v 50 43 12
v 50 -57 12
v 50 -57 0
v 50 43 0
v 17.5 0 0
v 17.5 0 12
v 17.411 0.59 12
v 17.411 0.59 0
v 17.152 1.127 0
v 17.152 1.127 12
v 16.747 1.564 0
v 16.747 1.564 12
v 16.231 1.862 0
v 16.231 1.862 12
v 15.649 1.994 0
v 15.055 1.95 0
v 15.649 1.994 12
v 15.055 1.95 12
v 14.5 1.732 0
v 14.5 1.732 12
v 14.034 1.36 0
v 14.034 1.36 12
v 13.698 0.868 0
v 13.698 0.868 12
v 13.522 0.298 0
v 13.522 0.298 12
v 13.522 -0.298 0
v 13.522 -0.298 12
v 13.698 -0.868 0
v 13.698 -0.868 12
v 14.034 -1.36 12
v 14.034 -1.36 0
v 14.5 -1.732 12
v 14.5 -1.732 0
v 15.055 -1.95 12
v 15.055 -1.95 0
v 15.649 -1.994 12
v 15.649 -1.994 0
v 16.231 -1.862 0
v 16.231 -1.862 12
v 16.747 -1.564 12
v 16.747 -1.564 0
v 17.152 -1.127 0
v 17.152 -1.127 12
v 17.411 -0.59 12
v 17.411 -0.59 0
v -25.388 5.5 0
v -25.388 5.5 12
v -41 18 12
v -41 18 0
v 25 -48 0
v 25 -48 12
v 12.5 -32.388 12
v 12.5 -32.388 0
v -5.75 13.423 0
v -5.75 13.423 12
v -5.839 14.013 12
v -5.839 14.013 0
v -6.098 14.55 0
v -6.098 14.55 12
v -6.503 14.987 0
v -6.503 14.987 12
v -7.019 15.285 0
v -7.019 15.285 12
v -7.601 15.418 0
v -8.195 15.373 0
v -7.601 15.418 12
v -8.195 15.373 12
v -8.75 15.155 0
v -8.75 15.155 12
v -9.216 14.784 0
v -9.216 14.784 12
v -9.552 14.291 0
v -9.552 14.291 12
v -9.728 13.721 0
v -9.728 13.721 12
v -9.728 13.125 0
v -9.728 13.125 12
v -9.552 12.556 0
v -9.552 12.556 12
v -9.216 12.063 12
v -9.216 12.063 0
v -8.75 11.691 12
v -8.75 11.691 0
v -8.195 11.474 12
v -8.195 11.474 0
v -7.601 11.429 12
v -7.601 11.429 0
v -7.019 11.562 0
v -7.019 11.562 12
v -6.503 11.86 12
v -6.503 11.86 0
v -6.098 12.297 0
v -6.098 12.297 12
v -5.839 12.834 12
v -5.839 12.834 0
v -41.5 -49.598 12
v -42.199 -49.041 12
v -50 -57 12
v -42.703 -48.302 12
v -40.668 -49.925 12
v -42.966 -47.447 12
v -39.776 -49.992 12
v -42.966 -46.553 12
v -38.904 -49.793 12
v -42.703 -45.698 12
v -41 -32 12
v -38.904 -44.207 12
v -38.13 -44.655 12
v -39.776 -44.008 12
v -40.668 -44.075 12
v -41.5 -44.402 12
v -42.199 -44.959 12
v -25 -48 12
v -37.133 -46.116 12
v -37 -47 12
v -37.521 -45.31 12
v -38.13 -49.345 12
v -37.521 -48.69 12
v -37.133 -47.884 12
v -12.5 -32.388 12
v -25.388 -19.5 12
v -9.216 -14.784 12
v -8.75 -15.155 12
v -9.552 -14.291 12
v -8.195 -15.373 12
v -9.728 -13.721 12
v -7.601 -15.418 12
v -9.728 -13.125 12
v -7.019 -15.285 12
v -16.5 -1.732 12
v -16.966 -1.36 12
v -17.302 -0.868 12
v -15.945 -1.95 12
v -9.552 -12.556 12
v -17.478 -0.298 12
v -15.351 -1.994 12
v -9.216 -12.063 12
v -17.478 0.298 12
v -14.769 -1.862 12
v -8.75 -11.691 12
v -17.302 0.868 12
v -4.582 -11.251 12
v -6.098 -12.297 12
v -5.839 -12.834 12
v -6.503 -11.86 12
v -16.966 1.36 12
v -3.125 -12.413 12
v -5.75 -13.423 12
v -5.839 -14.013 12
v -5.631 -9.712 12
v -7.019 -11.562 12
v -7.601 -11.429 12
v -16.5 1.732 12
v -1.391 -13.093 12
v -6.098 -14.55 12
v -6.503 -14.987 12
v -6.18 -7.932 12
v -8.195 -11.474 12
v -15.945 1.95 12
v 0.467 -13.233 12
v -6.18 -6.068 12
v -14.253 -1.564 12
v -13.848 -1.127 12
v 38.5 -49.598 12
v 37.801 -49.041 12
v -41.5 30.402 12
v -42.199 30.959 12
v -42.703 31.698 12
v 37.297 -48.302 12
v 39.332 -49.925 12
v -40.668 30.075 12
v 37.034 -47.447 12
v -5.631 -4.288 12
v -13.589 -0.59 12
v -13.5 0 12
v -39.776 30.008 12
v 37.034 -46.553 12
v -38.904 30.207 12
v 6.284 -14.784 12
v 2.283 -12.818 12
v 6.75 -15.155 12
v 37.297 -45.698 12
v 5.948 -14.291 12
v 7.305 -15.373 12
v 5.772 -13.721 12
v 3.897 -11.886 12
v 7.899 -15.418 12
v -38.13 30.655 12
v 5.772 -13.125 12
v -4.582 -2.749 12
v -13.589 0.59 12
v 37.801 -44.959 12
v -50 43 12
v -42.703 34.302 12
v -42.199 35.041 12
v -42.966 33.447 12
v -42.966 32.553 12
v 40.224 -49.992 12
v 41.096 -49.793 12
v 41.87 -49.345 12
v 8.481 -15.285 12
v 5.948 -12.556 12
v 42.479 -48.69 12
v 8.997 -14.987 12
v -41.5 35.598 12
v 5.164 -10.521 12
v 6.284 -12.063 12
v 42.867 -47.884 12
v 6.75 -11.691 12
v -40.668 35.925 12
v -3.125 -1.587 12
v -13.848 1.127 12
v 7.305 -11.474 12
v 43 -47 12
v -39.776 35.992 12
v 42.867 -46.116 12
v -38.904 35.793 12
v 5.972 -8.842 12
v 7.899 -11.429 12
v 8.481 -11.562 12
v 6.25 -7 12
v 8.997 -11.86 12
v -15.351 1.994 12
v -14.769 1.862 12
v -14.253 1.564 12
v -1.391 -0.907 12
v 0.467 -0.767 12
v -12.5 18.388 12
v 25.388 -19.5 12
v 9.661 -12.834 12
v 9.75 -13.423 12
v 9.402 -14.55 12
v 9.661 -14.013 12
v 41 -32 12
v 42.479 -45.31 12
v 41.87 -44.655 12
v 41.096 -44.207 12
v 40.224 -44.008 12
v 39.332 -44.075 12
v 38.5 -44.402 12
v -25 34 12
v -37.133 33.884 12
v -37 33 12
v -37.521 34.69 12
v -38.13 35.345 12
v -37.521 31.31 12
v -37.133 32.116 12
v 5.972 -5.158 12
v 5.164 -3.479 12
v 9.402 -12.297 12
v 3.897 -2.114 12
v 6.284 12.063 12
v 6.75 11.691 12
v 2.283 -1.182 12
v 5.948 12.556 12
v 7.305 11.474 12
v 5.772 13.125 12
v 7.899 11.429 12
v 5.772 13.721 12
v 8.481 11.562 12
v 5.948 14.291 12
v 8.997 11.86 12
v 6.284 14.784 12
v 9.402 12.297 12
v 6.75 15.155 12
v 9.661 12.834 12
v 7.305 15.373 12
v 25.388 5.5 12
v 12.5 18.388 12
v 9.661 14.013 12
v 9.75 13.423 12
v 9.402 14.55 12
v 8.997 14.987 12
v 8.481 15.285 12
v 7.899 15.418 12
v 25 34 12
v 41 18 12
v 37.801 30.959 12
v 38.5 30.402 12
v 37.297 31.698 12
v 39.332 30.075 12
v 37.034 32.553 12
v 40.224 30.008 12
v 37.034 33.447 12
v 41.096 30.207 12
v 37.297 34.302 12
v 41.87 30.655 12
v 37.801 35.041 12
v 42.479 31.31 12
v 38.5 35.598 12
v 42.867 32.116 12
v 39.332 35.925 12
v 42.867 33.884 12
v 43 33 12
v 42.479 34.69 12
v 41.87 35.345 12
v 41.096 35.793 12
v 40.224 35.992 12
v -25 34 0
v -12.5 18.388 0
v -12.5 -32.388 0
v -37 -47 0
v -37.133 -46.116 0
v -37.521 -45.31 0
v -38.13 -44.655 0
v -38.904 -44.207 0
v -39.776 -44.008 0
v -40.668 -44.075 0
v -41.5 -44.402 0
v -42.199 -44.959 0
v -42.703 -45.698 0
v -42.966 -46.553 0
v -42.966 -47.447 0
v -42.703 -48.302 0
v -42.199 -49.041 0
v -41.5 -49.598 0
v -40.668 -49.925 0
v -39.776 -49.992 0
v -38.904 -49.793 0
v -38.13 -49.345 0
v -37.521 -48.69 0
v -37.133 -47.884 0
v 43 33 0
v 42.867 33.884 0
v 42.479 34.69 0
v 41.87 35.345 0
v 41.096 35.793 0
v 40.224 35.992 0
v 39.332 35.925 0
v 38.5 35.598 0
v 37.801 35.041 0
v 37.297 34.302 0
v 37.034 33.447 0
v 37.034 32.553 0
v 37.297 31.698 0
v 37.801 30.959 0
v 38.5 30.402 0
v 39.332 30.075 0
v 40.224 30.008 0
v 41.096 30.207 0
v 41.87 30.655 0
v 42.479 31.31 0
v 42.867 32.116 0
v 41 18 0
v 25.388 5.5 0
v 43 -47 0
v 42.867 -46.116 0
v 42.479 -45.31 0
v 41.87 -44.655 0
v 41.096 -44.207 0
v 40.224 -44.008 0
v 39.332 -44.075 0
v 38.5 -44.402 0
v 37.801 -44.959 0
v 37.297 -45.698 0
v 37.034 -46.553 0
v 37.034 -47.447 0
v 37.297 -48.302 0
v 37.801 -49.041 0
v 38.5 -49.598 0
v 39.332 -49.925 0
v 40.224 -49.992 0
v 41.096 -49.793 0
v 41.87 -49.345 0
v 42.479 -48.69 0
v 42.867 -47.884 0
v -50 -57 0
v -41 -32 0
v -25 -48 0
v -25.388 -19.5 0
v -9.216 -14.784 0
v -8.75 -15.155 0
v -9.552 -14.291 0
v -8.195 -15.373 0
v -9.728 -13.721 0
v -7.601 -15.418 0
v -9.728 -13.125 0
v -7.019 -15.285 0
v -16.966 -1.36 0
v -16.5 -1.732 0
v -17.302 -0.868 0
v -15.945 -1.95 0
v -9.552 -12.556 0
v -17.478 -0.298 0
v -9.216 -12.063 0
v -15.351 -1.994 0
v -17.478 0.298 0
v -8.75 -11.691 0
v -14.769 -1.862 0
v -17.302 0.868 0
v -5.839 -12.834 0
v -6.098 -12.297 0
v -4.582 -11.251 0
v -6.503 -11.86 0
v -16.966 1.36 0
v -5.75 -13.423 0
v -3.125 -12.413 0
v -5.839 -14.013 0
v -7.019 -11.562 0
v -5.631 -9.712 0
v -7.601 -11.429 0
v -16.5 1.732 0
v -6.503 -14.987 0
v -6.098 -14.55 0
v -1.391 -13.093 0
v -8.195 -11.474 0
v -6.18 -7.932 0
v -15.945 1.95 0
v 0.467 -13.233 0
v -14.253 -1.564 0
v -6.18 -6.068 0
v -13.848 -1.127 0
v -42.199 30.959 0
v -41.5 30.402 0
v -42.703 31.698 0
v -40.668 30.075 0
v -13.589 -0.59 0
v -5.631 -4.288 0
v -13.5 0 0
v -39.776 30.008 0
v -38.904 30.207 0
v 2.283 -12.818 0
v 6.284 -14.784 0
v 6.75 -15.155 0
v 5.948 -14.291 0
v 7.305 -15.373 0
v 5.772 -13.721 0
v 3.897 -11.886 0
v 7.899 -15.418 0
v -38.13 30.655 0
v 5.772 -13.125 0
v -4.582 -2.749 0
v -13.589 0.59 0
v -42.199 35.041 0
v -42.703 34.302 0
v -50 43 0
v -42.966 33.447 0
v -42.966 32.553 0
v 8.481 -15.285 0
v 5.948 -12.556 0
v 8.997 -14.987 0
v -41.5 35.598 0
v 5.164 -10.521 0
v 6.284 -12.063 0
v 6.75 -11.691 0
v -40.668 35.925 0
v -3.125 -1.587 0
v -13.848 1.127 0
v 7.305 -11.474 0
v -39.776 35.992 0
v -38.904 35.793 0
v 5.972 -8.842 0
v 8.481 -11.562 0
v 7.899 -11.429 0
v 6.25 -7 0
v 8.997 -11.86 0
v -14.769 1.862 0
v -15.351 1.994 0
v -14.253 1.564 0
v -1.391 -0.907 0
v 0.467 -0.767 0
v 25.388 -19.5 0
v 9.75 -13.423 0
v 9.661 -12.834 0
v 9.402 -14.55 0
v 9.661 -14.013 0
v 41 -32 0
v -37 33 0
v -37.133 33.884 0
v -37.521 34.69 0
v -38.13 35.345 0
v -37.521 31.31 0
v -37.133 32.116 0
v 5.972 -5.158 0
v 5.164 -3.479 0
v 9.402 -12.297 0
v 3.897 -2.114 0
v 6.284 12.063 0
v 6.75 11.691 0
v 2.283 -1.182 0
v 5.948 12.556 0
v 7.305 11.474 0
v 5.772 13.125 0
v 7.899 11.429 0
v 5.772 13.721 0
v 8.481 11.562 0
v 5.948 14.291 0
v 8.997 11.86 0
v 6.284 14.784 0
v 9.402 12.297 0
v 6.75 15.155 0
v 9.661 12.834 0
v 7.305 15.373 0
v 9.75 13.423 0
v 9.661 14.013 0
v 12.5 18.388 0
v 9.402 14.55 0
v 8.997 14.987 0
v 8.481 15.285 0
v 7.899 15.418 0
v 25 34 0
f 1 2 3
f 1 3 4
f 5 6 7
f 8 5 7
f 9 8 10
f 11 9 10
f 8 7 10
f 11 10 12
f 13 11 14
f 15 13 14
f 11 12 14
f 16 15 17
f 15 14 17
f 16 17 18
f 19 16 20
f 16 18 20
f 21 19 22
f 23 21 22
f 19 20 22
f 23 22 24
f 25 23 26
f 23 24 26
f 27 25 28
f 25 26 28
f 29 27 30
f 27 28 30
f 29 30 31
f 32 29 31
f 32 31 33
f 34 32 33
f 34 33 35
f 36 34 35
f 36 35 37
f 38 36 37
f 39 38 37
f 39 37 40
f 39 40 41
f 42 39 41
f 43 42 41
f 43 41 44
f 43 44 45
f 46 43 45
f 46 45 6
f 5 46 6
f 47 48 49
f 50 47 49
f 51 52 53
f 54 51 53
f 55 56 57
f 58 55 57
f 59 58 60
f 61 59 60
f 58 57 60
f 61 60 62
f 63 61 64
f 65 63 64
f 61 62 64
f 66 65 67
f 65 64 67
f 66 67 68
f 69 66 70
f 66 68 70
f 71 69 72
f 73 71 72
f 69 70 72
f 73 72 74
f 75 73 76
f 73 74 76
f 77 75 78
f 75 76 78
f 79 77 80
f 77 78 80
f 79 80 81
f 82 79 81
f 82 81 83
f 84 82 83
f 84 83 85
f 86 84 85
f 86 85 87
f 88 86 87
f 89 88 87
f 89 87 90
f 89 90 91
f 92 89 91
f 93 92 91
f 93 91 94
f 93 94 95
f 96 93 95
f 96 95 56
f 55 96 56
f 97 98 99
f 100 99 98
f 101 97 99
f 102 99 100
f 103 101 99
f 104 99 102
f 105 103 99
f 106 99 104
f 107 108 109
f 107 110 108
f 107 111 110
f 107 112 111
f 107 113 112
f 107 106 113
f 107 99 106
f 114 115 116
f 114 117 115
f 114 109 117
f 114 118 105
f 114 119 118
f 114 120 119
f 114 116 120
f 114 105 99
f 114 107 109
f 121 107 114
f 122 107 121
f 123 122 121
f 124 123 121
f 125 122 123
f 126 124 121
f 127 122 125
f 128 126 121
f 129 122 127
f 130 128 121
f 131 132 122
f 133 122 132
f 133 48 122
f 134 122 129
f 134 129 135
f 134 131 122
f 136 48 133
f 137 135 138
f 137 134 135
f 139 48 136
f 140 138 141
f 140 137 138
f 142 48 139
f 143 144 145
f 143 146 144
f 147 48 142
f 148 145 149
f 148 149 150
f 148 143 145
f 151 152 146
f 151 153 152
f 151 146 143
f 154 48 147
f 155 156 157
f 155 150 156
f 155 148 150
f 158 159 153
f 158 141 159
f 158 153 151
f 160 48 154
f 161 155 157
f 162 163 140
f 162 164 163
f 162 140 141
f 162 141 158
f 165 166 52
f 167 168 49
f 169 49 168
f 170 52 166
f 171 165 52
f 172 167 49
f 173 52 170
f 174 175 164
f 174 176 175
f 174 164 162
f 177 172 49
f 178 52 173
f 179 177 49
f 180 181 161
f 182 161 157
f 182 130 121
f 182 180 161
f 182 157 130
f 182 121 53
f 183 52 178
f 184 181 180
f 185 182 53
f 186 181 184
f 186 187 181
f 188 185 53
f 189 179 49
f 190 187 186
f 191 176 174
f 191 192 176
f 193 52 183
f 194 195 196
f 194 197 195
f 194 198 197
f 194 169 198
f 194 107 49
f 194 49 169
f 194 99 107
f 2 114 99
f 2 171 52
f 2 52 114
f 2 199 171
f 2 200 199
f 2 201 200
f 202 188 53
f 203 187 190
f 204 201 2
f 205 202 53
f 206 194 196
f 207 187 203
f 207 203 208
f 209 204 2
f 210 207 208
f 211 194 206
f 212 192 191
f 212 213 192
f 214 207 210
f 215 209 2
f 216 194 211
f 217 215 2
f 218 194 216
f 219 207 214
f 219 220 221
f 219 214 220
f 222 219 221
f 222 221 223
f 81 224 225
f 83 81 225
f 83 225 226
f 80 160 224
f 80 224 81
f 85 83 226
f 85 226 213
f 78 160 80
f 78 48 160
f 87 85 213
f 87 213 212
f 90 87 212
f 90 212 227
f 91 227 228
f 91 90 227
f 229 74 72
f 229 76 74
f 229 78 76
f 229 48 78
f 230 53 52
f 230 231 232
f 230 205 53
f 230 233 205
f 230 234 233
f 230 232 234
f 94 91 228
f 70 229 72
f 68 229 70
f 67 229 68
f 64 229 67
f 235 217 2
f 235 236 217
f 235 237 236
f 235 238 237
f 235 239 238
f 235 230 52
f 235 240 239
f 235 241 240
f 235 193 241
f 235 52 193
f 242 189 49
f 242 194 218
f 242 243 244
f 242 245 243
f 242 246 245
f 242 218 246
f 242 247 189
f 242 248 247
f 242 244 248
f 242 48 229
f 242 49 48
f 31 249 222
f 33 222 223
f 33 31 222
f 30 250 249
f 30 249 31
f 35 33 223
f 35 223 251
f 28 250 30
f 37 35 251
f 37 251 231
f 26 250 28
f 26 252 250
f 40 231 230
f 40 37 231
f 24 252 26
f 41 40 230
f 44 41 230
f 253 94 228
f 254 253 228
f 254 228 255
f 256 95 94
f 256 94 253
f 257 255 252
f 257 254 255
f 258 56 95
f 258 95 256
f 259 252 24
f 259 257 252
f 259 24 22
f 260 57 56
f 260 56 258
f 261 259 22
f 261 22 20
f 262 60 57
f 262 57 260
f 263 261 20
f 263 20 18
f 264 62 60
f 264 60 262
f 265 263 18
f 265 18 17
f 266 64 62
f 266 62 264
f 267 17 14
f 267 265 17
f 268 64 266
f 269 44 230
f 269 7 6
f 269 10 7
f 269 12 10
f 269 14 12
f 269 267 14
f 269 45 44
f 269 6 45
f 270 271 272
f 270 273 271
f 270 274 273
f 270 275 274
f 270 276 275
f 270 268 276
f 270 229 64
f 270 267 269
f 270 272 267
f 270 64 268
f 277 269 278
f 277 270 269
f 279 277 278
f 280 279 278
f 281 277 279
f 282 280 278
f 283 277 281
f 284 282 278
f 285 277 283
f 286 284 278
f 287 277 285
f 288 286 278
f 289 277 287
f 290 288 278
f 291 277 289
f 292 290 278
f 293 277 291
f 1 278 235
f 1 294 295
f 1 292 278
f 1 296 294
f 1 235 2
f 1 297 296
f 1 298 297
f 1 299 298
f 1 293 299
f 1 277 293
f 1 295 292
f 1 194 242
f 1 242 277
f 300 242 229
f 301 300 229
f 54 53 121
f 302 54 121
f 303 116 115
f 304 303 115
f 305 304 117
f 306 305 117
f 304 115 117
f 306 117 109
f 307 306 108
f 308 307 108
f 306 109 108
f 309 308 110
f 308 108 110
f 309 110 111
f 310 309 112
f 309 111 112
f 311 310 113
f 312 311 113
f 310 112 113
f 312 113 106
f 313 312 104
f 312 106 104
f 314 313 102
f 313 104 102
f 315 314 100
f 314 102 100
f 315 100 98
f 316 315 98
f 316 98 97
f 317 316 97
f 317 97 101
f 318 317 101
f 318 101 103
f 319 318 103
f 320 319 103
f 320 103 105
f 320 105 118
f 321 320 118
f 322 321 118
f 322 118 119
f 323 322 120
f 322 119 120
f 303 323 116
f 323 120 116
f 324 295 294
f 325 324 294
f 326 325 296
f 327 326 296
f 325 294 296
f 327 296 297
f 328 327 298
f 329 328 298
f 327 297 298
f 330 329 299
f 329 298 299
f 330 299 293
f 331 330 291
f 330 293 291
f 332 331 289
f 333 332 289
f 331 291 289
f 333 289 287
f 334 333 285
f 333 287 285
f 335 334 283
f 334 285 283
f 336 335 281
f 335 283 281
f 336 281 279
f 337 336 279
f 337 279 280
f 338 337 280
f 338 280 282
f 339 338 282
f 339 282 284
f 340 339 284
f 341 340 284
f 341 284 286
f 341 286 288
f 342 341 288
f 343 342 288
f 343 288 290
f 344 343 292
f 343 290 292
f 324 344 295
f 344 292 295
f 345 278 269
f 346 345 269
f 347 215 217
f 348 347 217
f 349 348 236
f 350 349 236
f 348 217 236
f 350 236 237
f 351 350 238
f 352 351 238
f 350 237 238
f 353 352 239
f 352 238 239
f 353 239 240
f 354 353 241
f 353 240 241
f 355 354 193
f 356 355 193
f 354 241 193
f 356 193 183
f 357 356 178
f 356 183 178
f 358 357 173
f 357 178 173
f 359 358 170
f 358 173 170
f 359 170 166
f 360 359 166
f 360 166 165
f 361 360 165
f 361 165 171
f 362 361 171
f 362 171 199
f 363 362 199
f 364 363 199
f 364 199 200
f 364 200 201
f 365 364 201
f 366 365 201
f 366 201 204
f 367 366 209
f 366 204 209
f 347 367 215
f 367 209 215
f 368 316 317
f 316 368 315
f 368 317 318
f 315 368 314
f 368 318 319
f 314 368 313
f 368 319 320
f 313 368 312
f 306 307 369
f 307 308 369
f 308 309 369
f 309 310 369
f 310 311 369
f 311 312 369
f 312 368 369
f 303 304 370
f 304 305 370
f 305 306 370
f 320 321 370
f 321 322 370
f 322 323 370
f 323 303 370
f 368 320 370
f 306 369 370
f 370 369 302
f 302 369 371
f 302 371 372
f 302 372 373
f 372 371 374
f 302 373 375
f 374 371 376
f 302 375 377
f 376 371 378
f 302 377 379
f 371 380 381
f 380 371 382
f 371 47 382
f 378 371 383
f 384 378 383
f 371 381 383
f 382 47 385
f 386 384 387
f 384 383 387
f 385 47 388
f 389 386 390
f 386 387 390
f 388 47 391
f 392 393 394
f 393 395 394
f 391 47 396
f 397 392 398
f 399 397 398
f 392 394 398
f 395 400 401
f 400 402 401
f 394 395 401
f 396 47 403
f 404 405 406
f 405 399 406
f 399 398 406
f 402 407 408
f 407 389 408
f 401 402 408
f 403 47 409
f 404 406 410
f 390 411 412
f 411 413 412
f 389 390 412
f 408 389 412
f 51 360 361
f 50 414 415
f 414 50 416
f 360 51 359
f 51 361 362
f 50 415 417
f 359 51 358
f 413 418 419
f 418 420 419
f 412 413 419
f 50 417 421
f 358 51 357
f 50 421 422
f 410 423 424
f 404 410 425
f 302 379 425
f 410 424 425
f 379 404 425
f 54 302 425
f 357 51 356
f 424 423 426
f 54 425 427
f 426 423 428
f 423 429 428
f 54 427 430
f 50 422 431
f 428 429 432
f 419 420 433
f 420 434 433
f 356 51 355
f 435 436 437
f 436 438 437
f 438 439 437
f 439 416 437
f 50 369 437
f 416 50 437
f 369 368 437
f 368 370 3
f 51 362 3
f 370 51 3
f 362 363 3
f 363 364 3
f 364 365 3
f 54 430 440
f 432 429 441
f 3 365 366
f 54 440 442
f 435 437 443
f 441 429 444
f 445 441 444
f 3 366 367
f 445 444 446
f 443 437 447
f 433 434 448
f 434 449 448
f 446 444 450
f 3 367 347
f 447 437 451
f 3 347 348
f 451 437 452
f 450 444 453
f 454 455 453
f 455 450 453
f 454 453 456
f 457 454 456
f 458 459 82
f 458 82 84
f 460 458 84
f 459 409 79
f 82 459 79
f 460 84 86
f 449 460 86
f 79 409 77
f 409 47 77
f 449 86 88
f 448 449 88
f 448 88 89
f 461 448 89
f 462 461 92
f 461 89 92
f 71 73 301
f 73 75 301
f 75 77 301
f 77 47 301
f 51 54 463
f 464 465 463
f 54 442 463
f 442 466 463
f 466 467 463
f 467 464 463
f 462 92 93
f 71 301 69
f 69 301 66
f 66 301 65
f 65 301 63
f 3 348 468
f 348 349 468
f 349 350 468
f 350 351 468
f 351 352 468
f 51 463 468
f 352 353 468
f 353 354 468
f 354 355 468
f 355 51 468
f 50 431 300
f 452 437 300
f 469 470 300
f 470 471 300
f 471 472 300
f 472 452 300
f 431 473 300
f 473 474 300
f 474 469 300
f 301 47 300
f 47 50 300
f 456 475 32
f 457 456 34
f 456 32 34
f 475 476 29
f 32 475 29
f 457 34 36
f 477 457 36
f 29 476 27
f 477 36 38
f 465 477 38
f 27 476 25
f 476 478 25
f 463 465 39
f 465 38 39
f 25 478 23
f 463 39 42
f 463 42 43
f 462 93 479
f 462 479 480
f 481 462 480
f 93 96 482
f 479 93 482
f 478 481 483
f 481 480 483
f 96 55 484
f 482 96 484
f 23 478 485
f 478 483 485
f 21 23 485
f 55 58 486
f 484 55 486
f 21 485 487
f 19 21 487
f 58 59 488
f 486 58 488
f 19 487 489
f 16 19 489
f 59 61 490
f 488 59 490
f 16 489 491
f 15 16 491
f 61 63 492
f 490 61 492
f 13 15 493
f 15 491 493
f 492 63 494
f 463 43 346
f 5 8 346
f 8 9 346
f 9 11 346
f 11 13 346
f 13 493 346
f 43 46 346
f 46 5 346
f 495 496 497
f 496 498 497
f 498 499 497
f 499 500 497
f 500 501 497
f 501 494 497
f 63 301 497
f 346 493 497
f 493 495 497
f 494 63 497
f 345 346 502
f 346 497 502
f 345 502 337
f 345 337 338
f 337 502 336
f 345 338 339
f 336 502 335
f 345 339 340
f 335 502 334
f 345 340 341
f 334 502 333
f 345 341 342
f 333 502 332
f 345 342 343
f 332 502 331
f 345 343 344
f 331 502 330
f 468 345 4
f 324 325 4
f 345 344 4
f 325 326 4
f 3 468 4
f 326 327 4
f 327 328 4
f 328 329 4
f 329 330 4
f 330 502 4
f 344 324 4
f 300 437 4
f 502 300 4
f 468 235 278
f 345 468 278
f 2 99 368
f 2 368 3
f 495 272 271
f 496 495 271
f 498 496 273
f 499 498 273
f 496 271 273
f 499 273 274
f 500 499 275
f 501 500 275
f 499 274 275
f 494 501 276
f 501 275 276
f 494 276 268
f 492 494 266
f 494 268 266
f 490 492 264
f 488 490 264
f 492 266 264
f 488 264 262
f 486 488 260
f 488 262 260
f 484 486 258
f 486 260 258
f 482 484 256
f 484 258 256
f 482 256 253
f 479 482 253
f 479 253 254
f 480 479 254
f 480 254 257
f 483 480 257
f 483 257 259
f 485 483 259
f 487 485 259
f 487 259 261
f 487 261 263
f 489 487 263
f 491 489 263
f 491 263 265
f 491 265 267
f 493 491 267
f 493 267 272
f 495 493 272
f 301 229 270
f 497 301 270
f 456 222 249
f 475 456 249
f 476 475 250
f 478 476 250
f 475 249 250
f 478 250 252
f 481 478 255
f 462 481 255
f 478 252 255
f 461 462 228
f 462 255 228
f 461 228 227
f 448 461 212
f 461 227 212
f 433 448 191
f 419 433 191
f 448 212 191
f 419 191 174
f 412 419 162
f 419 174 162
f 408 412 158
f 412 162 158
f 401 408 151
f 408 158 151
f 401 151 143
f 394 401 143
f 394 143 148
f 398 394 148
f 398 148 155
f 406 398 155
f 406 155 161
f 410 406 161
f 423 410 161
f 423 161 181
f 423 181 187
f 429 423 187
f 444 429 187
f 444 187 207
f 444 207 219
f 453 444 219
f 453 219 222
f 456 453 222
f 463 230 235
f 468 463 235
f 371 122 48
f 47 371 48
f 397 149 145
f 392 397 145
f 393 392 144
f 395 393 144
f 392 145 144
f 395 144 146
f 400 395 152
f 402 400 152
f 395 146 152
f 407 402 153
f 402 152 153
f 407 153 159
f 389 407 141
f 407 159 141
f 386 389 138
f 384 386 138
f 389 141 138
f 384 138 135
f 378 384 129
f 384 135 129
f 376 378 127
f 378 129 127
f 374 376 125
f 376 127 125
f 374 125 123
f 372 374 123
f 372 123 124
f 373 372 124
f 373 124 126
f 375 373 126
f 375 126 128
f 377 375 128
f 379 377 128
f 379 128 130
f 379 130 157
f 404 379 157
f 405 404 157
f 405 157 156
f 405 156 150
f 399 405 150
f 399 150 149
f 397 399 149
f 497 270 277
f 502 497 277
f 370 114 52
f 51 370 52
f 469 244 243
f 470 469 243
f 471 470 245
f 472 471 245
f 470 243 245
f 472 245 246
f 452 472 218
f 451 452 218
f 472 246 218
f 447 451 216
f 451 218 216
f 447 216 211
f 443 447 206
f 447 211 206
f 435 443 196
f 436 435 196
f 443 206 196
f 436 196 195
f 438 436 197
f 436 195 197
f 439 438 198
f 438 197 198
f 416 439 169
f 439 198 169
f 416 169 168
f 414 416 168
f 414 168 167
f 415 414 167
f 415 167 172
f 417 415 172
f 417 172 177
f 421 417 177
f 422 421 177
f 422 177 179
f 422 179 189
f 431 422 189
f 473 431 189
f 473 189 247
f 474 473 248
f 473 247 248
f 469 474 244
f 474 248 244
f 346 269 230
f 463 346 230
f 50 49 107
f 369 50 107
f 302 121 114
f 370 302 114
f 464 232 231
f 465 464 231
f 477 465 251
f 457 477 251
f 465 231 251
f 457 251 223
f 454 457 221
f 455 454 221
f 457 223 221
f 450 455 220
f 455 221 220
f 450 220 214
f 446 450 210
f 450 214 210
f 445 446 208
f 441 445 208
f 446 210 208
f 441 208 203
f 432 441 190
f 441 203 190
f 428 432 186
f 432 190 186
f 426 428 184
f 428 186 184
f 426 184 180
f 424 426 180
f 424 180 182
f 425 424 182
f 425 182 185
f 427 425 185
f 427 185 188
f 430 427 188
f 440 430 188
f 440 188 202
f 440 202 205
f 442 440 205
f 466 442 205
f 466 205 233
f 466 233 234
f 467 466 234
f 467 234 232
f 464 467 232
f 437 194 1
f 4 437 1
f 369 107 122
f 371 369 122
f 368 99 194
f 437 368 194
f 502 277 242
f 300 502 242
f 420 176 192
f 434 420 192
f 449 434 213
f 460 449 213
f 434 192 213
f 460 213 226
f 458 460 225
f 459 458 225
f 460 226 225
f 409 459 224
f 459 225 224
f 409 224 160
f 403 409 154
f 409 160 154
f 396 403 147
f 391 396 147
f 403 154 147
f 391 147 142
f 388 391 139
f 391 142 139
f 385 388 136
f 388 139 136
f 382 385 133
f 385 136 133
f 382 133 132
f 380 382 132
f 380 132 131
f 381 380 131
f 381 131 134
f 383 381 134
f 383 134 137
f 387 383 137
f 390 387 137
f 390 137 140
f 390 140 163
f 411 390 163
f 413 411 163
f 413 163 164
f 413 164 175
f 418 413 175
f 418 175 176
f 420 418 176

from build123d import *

# Parameters (mm, degrees)
ESQUISSE1_R             = 18.5
BOSS_EXTRU_1_DEPTH      = 12
ESQUISSE2_R             = 2
ENL_V_MAT_EXTRU_1_DEPTH = 13
ESQUISSE3_R             = 6.25
ENL_V_MAT_EXTRU_2_DEPTH = 13
ESQUISSE4_W             = 100
ESQUISSE4_H             = 100
ESQUISSE4_R             = 18.5
BOSS_EXTRU_2_DEPTH      = 12
ESQUISSE5_R             = 3
ENL_V_MAT_EXTRU_3_DEPTH = 12
ENL_V_MAT_EXTRU_4_DEPTH = 12


with BuildPart() as part:
    # Esquisse1 → Boss.-Extru.1 (new body)
    with BuildSketch(Plane.XY):
        Circle(ESQUISSE1_R)
    extrude(amount=BOSS_EXTRU_1_DEPTH)

    # Esquisse2 → Enlèv. mat.-Extru.1 (cut, through all)
    with BuildSketch(Plane.XY.offset(12)):
        with Locations((15.5, 0)):
            Circle(ESQUISSE2_R)
        with Locations((7.75, -13.423393759)):
            Circle(ESQUISSE2_R)
        with Locations((-7.75, -13.423393759)):
            Circle(ESQUISSE2_R)
        with Locations((-15.5, 0)):
            Circle(ESQUISSE2_R)
        with Locations((-7.75, 13.423393759)):
            Circle(ESQUISSE2_R)
        with Locations((7.75, 13.423393759)):
            Circle(ESQUISSE2_R)
    extrude(amount=-ENL_V_MAT_EXTRU_1_DEPTH, mode=Mode.SUBTRACT)

    # Esquisse3 → Enlèv. mat.-Extru.2 (cut, through all)
    with BuildSketch(Plane.XY.offset(12)):
        with Locations((0, -7)):
            Circle(ESQUISSE3_R)
    extrude(amount=-ENL_V_MAT_EXTRU_2_DEPTH, mode=Mode.SUBTRACT)

    # Esquisse4 → Boss.-Extru.2 (add)
    with BuildSketch(Plane.XY.offset(12)):
        with Locations((0, -7)):
            Rectangle(ESQUISSE4_W, ESQUISSE4_H)
        Circle(ESQUISSE4_R, mode=Mode.SUBTRACT)
    extrude(amount=-BOSS_EXTRU_2_DEPTH)

    # Esquisse5 → Enlèv. mat.-Extru.3 (cut)
    with BuildSketch(Plane.XY.offset(12)):
        with Locations((-40, 33)):
            Circle(ESQUISSE5_R)
        with Locations((40, 33)):
            Circle(ESQUISSE5_R)
        with Locations((40, -47)):
            Circle(ESQUISSE5_R)
        with Locations((-40, -47)):
            Circle(ESQUISSE5_R)
    extrude(amount=-ENL_V_MAT_EXTRU_3_DEPTH, mode=Mode.SUBTRACT)

    # Esquisse6 → Enlèv. mat.-Extru.4 (cut)
    with BuildSketch(Plane.XY.offset(12)):
        Polygon((-41, 18), (-41, -32), (-25.387505004, -19.5), (-25.387505004, 5.5), align=None)
        Polygon((12.5, 18.387505004), (25, 34), (-25, 34), (-12.5, 18.387505004), align=None)
        Polygon((25.387505004, -19.5), (41, -32), (41, 18), (25.387505004, 5.5), align=None)
        Polygon((-12.5, -32.387505004), (-25, -48), (25, -48), (12.5, -32.387505004), align=None)
    extrude(amount=-ENL_V_MAT_EXTRU_4_DEPTH, mode=Mode.SUBTRACT)


solid = part.part
